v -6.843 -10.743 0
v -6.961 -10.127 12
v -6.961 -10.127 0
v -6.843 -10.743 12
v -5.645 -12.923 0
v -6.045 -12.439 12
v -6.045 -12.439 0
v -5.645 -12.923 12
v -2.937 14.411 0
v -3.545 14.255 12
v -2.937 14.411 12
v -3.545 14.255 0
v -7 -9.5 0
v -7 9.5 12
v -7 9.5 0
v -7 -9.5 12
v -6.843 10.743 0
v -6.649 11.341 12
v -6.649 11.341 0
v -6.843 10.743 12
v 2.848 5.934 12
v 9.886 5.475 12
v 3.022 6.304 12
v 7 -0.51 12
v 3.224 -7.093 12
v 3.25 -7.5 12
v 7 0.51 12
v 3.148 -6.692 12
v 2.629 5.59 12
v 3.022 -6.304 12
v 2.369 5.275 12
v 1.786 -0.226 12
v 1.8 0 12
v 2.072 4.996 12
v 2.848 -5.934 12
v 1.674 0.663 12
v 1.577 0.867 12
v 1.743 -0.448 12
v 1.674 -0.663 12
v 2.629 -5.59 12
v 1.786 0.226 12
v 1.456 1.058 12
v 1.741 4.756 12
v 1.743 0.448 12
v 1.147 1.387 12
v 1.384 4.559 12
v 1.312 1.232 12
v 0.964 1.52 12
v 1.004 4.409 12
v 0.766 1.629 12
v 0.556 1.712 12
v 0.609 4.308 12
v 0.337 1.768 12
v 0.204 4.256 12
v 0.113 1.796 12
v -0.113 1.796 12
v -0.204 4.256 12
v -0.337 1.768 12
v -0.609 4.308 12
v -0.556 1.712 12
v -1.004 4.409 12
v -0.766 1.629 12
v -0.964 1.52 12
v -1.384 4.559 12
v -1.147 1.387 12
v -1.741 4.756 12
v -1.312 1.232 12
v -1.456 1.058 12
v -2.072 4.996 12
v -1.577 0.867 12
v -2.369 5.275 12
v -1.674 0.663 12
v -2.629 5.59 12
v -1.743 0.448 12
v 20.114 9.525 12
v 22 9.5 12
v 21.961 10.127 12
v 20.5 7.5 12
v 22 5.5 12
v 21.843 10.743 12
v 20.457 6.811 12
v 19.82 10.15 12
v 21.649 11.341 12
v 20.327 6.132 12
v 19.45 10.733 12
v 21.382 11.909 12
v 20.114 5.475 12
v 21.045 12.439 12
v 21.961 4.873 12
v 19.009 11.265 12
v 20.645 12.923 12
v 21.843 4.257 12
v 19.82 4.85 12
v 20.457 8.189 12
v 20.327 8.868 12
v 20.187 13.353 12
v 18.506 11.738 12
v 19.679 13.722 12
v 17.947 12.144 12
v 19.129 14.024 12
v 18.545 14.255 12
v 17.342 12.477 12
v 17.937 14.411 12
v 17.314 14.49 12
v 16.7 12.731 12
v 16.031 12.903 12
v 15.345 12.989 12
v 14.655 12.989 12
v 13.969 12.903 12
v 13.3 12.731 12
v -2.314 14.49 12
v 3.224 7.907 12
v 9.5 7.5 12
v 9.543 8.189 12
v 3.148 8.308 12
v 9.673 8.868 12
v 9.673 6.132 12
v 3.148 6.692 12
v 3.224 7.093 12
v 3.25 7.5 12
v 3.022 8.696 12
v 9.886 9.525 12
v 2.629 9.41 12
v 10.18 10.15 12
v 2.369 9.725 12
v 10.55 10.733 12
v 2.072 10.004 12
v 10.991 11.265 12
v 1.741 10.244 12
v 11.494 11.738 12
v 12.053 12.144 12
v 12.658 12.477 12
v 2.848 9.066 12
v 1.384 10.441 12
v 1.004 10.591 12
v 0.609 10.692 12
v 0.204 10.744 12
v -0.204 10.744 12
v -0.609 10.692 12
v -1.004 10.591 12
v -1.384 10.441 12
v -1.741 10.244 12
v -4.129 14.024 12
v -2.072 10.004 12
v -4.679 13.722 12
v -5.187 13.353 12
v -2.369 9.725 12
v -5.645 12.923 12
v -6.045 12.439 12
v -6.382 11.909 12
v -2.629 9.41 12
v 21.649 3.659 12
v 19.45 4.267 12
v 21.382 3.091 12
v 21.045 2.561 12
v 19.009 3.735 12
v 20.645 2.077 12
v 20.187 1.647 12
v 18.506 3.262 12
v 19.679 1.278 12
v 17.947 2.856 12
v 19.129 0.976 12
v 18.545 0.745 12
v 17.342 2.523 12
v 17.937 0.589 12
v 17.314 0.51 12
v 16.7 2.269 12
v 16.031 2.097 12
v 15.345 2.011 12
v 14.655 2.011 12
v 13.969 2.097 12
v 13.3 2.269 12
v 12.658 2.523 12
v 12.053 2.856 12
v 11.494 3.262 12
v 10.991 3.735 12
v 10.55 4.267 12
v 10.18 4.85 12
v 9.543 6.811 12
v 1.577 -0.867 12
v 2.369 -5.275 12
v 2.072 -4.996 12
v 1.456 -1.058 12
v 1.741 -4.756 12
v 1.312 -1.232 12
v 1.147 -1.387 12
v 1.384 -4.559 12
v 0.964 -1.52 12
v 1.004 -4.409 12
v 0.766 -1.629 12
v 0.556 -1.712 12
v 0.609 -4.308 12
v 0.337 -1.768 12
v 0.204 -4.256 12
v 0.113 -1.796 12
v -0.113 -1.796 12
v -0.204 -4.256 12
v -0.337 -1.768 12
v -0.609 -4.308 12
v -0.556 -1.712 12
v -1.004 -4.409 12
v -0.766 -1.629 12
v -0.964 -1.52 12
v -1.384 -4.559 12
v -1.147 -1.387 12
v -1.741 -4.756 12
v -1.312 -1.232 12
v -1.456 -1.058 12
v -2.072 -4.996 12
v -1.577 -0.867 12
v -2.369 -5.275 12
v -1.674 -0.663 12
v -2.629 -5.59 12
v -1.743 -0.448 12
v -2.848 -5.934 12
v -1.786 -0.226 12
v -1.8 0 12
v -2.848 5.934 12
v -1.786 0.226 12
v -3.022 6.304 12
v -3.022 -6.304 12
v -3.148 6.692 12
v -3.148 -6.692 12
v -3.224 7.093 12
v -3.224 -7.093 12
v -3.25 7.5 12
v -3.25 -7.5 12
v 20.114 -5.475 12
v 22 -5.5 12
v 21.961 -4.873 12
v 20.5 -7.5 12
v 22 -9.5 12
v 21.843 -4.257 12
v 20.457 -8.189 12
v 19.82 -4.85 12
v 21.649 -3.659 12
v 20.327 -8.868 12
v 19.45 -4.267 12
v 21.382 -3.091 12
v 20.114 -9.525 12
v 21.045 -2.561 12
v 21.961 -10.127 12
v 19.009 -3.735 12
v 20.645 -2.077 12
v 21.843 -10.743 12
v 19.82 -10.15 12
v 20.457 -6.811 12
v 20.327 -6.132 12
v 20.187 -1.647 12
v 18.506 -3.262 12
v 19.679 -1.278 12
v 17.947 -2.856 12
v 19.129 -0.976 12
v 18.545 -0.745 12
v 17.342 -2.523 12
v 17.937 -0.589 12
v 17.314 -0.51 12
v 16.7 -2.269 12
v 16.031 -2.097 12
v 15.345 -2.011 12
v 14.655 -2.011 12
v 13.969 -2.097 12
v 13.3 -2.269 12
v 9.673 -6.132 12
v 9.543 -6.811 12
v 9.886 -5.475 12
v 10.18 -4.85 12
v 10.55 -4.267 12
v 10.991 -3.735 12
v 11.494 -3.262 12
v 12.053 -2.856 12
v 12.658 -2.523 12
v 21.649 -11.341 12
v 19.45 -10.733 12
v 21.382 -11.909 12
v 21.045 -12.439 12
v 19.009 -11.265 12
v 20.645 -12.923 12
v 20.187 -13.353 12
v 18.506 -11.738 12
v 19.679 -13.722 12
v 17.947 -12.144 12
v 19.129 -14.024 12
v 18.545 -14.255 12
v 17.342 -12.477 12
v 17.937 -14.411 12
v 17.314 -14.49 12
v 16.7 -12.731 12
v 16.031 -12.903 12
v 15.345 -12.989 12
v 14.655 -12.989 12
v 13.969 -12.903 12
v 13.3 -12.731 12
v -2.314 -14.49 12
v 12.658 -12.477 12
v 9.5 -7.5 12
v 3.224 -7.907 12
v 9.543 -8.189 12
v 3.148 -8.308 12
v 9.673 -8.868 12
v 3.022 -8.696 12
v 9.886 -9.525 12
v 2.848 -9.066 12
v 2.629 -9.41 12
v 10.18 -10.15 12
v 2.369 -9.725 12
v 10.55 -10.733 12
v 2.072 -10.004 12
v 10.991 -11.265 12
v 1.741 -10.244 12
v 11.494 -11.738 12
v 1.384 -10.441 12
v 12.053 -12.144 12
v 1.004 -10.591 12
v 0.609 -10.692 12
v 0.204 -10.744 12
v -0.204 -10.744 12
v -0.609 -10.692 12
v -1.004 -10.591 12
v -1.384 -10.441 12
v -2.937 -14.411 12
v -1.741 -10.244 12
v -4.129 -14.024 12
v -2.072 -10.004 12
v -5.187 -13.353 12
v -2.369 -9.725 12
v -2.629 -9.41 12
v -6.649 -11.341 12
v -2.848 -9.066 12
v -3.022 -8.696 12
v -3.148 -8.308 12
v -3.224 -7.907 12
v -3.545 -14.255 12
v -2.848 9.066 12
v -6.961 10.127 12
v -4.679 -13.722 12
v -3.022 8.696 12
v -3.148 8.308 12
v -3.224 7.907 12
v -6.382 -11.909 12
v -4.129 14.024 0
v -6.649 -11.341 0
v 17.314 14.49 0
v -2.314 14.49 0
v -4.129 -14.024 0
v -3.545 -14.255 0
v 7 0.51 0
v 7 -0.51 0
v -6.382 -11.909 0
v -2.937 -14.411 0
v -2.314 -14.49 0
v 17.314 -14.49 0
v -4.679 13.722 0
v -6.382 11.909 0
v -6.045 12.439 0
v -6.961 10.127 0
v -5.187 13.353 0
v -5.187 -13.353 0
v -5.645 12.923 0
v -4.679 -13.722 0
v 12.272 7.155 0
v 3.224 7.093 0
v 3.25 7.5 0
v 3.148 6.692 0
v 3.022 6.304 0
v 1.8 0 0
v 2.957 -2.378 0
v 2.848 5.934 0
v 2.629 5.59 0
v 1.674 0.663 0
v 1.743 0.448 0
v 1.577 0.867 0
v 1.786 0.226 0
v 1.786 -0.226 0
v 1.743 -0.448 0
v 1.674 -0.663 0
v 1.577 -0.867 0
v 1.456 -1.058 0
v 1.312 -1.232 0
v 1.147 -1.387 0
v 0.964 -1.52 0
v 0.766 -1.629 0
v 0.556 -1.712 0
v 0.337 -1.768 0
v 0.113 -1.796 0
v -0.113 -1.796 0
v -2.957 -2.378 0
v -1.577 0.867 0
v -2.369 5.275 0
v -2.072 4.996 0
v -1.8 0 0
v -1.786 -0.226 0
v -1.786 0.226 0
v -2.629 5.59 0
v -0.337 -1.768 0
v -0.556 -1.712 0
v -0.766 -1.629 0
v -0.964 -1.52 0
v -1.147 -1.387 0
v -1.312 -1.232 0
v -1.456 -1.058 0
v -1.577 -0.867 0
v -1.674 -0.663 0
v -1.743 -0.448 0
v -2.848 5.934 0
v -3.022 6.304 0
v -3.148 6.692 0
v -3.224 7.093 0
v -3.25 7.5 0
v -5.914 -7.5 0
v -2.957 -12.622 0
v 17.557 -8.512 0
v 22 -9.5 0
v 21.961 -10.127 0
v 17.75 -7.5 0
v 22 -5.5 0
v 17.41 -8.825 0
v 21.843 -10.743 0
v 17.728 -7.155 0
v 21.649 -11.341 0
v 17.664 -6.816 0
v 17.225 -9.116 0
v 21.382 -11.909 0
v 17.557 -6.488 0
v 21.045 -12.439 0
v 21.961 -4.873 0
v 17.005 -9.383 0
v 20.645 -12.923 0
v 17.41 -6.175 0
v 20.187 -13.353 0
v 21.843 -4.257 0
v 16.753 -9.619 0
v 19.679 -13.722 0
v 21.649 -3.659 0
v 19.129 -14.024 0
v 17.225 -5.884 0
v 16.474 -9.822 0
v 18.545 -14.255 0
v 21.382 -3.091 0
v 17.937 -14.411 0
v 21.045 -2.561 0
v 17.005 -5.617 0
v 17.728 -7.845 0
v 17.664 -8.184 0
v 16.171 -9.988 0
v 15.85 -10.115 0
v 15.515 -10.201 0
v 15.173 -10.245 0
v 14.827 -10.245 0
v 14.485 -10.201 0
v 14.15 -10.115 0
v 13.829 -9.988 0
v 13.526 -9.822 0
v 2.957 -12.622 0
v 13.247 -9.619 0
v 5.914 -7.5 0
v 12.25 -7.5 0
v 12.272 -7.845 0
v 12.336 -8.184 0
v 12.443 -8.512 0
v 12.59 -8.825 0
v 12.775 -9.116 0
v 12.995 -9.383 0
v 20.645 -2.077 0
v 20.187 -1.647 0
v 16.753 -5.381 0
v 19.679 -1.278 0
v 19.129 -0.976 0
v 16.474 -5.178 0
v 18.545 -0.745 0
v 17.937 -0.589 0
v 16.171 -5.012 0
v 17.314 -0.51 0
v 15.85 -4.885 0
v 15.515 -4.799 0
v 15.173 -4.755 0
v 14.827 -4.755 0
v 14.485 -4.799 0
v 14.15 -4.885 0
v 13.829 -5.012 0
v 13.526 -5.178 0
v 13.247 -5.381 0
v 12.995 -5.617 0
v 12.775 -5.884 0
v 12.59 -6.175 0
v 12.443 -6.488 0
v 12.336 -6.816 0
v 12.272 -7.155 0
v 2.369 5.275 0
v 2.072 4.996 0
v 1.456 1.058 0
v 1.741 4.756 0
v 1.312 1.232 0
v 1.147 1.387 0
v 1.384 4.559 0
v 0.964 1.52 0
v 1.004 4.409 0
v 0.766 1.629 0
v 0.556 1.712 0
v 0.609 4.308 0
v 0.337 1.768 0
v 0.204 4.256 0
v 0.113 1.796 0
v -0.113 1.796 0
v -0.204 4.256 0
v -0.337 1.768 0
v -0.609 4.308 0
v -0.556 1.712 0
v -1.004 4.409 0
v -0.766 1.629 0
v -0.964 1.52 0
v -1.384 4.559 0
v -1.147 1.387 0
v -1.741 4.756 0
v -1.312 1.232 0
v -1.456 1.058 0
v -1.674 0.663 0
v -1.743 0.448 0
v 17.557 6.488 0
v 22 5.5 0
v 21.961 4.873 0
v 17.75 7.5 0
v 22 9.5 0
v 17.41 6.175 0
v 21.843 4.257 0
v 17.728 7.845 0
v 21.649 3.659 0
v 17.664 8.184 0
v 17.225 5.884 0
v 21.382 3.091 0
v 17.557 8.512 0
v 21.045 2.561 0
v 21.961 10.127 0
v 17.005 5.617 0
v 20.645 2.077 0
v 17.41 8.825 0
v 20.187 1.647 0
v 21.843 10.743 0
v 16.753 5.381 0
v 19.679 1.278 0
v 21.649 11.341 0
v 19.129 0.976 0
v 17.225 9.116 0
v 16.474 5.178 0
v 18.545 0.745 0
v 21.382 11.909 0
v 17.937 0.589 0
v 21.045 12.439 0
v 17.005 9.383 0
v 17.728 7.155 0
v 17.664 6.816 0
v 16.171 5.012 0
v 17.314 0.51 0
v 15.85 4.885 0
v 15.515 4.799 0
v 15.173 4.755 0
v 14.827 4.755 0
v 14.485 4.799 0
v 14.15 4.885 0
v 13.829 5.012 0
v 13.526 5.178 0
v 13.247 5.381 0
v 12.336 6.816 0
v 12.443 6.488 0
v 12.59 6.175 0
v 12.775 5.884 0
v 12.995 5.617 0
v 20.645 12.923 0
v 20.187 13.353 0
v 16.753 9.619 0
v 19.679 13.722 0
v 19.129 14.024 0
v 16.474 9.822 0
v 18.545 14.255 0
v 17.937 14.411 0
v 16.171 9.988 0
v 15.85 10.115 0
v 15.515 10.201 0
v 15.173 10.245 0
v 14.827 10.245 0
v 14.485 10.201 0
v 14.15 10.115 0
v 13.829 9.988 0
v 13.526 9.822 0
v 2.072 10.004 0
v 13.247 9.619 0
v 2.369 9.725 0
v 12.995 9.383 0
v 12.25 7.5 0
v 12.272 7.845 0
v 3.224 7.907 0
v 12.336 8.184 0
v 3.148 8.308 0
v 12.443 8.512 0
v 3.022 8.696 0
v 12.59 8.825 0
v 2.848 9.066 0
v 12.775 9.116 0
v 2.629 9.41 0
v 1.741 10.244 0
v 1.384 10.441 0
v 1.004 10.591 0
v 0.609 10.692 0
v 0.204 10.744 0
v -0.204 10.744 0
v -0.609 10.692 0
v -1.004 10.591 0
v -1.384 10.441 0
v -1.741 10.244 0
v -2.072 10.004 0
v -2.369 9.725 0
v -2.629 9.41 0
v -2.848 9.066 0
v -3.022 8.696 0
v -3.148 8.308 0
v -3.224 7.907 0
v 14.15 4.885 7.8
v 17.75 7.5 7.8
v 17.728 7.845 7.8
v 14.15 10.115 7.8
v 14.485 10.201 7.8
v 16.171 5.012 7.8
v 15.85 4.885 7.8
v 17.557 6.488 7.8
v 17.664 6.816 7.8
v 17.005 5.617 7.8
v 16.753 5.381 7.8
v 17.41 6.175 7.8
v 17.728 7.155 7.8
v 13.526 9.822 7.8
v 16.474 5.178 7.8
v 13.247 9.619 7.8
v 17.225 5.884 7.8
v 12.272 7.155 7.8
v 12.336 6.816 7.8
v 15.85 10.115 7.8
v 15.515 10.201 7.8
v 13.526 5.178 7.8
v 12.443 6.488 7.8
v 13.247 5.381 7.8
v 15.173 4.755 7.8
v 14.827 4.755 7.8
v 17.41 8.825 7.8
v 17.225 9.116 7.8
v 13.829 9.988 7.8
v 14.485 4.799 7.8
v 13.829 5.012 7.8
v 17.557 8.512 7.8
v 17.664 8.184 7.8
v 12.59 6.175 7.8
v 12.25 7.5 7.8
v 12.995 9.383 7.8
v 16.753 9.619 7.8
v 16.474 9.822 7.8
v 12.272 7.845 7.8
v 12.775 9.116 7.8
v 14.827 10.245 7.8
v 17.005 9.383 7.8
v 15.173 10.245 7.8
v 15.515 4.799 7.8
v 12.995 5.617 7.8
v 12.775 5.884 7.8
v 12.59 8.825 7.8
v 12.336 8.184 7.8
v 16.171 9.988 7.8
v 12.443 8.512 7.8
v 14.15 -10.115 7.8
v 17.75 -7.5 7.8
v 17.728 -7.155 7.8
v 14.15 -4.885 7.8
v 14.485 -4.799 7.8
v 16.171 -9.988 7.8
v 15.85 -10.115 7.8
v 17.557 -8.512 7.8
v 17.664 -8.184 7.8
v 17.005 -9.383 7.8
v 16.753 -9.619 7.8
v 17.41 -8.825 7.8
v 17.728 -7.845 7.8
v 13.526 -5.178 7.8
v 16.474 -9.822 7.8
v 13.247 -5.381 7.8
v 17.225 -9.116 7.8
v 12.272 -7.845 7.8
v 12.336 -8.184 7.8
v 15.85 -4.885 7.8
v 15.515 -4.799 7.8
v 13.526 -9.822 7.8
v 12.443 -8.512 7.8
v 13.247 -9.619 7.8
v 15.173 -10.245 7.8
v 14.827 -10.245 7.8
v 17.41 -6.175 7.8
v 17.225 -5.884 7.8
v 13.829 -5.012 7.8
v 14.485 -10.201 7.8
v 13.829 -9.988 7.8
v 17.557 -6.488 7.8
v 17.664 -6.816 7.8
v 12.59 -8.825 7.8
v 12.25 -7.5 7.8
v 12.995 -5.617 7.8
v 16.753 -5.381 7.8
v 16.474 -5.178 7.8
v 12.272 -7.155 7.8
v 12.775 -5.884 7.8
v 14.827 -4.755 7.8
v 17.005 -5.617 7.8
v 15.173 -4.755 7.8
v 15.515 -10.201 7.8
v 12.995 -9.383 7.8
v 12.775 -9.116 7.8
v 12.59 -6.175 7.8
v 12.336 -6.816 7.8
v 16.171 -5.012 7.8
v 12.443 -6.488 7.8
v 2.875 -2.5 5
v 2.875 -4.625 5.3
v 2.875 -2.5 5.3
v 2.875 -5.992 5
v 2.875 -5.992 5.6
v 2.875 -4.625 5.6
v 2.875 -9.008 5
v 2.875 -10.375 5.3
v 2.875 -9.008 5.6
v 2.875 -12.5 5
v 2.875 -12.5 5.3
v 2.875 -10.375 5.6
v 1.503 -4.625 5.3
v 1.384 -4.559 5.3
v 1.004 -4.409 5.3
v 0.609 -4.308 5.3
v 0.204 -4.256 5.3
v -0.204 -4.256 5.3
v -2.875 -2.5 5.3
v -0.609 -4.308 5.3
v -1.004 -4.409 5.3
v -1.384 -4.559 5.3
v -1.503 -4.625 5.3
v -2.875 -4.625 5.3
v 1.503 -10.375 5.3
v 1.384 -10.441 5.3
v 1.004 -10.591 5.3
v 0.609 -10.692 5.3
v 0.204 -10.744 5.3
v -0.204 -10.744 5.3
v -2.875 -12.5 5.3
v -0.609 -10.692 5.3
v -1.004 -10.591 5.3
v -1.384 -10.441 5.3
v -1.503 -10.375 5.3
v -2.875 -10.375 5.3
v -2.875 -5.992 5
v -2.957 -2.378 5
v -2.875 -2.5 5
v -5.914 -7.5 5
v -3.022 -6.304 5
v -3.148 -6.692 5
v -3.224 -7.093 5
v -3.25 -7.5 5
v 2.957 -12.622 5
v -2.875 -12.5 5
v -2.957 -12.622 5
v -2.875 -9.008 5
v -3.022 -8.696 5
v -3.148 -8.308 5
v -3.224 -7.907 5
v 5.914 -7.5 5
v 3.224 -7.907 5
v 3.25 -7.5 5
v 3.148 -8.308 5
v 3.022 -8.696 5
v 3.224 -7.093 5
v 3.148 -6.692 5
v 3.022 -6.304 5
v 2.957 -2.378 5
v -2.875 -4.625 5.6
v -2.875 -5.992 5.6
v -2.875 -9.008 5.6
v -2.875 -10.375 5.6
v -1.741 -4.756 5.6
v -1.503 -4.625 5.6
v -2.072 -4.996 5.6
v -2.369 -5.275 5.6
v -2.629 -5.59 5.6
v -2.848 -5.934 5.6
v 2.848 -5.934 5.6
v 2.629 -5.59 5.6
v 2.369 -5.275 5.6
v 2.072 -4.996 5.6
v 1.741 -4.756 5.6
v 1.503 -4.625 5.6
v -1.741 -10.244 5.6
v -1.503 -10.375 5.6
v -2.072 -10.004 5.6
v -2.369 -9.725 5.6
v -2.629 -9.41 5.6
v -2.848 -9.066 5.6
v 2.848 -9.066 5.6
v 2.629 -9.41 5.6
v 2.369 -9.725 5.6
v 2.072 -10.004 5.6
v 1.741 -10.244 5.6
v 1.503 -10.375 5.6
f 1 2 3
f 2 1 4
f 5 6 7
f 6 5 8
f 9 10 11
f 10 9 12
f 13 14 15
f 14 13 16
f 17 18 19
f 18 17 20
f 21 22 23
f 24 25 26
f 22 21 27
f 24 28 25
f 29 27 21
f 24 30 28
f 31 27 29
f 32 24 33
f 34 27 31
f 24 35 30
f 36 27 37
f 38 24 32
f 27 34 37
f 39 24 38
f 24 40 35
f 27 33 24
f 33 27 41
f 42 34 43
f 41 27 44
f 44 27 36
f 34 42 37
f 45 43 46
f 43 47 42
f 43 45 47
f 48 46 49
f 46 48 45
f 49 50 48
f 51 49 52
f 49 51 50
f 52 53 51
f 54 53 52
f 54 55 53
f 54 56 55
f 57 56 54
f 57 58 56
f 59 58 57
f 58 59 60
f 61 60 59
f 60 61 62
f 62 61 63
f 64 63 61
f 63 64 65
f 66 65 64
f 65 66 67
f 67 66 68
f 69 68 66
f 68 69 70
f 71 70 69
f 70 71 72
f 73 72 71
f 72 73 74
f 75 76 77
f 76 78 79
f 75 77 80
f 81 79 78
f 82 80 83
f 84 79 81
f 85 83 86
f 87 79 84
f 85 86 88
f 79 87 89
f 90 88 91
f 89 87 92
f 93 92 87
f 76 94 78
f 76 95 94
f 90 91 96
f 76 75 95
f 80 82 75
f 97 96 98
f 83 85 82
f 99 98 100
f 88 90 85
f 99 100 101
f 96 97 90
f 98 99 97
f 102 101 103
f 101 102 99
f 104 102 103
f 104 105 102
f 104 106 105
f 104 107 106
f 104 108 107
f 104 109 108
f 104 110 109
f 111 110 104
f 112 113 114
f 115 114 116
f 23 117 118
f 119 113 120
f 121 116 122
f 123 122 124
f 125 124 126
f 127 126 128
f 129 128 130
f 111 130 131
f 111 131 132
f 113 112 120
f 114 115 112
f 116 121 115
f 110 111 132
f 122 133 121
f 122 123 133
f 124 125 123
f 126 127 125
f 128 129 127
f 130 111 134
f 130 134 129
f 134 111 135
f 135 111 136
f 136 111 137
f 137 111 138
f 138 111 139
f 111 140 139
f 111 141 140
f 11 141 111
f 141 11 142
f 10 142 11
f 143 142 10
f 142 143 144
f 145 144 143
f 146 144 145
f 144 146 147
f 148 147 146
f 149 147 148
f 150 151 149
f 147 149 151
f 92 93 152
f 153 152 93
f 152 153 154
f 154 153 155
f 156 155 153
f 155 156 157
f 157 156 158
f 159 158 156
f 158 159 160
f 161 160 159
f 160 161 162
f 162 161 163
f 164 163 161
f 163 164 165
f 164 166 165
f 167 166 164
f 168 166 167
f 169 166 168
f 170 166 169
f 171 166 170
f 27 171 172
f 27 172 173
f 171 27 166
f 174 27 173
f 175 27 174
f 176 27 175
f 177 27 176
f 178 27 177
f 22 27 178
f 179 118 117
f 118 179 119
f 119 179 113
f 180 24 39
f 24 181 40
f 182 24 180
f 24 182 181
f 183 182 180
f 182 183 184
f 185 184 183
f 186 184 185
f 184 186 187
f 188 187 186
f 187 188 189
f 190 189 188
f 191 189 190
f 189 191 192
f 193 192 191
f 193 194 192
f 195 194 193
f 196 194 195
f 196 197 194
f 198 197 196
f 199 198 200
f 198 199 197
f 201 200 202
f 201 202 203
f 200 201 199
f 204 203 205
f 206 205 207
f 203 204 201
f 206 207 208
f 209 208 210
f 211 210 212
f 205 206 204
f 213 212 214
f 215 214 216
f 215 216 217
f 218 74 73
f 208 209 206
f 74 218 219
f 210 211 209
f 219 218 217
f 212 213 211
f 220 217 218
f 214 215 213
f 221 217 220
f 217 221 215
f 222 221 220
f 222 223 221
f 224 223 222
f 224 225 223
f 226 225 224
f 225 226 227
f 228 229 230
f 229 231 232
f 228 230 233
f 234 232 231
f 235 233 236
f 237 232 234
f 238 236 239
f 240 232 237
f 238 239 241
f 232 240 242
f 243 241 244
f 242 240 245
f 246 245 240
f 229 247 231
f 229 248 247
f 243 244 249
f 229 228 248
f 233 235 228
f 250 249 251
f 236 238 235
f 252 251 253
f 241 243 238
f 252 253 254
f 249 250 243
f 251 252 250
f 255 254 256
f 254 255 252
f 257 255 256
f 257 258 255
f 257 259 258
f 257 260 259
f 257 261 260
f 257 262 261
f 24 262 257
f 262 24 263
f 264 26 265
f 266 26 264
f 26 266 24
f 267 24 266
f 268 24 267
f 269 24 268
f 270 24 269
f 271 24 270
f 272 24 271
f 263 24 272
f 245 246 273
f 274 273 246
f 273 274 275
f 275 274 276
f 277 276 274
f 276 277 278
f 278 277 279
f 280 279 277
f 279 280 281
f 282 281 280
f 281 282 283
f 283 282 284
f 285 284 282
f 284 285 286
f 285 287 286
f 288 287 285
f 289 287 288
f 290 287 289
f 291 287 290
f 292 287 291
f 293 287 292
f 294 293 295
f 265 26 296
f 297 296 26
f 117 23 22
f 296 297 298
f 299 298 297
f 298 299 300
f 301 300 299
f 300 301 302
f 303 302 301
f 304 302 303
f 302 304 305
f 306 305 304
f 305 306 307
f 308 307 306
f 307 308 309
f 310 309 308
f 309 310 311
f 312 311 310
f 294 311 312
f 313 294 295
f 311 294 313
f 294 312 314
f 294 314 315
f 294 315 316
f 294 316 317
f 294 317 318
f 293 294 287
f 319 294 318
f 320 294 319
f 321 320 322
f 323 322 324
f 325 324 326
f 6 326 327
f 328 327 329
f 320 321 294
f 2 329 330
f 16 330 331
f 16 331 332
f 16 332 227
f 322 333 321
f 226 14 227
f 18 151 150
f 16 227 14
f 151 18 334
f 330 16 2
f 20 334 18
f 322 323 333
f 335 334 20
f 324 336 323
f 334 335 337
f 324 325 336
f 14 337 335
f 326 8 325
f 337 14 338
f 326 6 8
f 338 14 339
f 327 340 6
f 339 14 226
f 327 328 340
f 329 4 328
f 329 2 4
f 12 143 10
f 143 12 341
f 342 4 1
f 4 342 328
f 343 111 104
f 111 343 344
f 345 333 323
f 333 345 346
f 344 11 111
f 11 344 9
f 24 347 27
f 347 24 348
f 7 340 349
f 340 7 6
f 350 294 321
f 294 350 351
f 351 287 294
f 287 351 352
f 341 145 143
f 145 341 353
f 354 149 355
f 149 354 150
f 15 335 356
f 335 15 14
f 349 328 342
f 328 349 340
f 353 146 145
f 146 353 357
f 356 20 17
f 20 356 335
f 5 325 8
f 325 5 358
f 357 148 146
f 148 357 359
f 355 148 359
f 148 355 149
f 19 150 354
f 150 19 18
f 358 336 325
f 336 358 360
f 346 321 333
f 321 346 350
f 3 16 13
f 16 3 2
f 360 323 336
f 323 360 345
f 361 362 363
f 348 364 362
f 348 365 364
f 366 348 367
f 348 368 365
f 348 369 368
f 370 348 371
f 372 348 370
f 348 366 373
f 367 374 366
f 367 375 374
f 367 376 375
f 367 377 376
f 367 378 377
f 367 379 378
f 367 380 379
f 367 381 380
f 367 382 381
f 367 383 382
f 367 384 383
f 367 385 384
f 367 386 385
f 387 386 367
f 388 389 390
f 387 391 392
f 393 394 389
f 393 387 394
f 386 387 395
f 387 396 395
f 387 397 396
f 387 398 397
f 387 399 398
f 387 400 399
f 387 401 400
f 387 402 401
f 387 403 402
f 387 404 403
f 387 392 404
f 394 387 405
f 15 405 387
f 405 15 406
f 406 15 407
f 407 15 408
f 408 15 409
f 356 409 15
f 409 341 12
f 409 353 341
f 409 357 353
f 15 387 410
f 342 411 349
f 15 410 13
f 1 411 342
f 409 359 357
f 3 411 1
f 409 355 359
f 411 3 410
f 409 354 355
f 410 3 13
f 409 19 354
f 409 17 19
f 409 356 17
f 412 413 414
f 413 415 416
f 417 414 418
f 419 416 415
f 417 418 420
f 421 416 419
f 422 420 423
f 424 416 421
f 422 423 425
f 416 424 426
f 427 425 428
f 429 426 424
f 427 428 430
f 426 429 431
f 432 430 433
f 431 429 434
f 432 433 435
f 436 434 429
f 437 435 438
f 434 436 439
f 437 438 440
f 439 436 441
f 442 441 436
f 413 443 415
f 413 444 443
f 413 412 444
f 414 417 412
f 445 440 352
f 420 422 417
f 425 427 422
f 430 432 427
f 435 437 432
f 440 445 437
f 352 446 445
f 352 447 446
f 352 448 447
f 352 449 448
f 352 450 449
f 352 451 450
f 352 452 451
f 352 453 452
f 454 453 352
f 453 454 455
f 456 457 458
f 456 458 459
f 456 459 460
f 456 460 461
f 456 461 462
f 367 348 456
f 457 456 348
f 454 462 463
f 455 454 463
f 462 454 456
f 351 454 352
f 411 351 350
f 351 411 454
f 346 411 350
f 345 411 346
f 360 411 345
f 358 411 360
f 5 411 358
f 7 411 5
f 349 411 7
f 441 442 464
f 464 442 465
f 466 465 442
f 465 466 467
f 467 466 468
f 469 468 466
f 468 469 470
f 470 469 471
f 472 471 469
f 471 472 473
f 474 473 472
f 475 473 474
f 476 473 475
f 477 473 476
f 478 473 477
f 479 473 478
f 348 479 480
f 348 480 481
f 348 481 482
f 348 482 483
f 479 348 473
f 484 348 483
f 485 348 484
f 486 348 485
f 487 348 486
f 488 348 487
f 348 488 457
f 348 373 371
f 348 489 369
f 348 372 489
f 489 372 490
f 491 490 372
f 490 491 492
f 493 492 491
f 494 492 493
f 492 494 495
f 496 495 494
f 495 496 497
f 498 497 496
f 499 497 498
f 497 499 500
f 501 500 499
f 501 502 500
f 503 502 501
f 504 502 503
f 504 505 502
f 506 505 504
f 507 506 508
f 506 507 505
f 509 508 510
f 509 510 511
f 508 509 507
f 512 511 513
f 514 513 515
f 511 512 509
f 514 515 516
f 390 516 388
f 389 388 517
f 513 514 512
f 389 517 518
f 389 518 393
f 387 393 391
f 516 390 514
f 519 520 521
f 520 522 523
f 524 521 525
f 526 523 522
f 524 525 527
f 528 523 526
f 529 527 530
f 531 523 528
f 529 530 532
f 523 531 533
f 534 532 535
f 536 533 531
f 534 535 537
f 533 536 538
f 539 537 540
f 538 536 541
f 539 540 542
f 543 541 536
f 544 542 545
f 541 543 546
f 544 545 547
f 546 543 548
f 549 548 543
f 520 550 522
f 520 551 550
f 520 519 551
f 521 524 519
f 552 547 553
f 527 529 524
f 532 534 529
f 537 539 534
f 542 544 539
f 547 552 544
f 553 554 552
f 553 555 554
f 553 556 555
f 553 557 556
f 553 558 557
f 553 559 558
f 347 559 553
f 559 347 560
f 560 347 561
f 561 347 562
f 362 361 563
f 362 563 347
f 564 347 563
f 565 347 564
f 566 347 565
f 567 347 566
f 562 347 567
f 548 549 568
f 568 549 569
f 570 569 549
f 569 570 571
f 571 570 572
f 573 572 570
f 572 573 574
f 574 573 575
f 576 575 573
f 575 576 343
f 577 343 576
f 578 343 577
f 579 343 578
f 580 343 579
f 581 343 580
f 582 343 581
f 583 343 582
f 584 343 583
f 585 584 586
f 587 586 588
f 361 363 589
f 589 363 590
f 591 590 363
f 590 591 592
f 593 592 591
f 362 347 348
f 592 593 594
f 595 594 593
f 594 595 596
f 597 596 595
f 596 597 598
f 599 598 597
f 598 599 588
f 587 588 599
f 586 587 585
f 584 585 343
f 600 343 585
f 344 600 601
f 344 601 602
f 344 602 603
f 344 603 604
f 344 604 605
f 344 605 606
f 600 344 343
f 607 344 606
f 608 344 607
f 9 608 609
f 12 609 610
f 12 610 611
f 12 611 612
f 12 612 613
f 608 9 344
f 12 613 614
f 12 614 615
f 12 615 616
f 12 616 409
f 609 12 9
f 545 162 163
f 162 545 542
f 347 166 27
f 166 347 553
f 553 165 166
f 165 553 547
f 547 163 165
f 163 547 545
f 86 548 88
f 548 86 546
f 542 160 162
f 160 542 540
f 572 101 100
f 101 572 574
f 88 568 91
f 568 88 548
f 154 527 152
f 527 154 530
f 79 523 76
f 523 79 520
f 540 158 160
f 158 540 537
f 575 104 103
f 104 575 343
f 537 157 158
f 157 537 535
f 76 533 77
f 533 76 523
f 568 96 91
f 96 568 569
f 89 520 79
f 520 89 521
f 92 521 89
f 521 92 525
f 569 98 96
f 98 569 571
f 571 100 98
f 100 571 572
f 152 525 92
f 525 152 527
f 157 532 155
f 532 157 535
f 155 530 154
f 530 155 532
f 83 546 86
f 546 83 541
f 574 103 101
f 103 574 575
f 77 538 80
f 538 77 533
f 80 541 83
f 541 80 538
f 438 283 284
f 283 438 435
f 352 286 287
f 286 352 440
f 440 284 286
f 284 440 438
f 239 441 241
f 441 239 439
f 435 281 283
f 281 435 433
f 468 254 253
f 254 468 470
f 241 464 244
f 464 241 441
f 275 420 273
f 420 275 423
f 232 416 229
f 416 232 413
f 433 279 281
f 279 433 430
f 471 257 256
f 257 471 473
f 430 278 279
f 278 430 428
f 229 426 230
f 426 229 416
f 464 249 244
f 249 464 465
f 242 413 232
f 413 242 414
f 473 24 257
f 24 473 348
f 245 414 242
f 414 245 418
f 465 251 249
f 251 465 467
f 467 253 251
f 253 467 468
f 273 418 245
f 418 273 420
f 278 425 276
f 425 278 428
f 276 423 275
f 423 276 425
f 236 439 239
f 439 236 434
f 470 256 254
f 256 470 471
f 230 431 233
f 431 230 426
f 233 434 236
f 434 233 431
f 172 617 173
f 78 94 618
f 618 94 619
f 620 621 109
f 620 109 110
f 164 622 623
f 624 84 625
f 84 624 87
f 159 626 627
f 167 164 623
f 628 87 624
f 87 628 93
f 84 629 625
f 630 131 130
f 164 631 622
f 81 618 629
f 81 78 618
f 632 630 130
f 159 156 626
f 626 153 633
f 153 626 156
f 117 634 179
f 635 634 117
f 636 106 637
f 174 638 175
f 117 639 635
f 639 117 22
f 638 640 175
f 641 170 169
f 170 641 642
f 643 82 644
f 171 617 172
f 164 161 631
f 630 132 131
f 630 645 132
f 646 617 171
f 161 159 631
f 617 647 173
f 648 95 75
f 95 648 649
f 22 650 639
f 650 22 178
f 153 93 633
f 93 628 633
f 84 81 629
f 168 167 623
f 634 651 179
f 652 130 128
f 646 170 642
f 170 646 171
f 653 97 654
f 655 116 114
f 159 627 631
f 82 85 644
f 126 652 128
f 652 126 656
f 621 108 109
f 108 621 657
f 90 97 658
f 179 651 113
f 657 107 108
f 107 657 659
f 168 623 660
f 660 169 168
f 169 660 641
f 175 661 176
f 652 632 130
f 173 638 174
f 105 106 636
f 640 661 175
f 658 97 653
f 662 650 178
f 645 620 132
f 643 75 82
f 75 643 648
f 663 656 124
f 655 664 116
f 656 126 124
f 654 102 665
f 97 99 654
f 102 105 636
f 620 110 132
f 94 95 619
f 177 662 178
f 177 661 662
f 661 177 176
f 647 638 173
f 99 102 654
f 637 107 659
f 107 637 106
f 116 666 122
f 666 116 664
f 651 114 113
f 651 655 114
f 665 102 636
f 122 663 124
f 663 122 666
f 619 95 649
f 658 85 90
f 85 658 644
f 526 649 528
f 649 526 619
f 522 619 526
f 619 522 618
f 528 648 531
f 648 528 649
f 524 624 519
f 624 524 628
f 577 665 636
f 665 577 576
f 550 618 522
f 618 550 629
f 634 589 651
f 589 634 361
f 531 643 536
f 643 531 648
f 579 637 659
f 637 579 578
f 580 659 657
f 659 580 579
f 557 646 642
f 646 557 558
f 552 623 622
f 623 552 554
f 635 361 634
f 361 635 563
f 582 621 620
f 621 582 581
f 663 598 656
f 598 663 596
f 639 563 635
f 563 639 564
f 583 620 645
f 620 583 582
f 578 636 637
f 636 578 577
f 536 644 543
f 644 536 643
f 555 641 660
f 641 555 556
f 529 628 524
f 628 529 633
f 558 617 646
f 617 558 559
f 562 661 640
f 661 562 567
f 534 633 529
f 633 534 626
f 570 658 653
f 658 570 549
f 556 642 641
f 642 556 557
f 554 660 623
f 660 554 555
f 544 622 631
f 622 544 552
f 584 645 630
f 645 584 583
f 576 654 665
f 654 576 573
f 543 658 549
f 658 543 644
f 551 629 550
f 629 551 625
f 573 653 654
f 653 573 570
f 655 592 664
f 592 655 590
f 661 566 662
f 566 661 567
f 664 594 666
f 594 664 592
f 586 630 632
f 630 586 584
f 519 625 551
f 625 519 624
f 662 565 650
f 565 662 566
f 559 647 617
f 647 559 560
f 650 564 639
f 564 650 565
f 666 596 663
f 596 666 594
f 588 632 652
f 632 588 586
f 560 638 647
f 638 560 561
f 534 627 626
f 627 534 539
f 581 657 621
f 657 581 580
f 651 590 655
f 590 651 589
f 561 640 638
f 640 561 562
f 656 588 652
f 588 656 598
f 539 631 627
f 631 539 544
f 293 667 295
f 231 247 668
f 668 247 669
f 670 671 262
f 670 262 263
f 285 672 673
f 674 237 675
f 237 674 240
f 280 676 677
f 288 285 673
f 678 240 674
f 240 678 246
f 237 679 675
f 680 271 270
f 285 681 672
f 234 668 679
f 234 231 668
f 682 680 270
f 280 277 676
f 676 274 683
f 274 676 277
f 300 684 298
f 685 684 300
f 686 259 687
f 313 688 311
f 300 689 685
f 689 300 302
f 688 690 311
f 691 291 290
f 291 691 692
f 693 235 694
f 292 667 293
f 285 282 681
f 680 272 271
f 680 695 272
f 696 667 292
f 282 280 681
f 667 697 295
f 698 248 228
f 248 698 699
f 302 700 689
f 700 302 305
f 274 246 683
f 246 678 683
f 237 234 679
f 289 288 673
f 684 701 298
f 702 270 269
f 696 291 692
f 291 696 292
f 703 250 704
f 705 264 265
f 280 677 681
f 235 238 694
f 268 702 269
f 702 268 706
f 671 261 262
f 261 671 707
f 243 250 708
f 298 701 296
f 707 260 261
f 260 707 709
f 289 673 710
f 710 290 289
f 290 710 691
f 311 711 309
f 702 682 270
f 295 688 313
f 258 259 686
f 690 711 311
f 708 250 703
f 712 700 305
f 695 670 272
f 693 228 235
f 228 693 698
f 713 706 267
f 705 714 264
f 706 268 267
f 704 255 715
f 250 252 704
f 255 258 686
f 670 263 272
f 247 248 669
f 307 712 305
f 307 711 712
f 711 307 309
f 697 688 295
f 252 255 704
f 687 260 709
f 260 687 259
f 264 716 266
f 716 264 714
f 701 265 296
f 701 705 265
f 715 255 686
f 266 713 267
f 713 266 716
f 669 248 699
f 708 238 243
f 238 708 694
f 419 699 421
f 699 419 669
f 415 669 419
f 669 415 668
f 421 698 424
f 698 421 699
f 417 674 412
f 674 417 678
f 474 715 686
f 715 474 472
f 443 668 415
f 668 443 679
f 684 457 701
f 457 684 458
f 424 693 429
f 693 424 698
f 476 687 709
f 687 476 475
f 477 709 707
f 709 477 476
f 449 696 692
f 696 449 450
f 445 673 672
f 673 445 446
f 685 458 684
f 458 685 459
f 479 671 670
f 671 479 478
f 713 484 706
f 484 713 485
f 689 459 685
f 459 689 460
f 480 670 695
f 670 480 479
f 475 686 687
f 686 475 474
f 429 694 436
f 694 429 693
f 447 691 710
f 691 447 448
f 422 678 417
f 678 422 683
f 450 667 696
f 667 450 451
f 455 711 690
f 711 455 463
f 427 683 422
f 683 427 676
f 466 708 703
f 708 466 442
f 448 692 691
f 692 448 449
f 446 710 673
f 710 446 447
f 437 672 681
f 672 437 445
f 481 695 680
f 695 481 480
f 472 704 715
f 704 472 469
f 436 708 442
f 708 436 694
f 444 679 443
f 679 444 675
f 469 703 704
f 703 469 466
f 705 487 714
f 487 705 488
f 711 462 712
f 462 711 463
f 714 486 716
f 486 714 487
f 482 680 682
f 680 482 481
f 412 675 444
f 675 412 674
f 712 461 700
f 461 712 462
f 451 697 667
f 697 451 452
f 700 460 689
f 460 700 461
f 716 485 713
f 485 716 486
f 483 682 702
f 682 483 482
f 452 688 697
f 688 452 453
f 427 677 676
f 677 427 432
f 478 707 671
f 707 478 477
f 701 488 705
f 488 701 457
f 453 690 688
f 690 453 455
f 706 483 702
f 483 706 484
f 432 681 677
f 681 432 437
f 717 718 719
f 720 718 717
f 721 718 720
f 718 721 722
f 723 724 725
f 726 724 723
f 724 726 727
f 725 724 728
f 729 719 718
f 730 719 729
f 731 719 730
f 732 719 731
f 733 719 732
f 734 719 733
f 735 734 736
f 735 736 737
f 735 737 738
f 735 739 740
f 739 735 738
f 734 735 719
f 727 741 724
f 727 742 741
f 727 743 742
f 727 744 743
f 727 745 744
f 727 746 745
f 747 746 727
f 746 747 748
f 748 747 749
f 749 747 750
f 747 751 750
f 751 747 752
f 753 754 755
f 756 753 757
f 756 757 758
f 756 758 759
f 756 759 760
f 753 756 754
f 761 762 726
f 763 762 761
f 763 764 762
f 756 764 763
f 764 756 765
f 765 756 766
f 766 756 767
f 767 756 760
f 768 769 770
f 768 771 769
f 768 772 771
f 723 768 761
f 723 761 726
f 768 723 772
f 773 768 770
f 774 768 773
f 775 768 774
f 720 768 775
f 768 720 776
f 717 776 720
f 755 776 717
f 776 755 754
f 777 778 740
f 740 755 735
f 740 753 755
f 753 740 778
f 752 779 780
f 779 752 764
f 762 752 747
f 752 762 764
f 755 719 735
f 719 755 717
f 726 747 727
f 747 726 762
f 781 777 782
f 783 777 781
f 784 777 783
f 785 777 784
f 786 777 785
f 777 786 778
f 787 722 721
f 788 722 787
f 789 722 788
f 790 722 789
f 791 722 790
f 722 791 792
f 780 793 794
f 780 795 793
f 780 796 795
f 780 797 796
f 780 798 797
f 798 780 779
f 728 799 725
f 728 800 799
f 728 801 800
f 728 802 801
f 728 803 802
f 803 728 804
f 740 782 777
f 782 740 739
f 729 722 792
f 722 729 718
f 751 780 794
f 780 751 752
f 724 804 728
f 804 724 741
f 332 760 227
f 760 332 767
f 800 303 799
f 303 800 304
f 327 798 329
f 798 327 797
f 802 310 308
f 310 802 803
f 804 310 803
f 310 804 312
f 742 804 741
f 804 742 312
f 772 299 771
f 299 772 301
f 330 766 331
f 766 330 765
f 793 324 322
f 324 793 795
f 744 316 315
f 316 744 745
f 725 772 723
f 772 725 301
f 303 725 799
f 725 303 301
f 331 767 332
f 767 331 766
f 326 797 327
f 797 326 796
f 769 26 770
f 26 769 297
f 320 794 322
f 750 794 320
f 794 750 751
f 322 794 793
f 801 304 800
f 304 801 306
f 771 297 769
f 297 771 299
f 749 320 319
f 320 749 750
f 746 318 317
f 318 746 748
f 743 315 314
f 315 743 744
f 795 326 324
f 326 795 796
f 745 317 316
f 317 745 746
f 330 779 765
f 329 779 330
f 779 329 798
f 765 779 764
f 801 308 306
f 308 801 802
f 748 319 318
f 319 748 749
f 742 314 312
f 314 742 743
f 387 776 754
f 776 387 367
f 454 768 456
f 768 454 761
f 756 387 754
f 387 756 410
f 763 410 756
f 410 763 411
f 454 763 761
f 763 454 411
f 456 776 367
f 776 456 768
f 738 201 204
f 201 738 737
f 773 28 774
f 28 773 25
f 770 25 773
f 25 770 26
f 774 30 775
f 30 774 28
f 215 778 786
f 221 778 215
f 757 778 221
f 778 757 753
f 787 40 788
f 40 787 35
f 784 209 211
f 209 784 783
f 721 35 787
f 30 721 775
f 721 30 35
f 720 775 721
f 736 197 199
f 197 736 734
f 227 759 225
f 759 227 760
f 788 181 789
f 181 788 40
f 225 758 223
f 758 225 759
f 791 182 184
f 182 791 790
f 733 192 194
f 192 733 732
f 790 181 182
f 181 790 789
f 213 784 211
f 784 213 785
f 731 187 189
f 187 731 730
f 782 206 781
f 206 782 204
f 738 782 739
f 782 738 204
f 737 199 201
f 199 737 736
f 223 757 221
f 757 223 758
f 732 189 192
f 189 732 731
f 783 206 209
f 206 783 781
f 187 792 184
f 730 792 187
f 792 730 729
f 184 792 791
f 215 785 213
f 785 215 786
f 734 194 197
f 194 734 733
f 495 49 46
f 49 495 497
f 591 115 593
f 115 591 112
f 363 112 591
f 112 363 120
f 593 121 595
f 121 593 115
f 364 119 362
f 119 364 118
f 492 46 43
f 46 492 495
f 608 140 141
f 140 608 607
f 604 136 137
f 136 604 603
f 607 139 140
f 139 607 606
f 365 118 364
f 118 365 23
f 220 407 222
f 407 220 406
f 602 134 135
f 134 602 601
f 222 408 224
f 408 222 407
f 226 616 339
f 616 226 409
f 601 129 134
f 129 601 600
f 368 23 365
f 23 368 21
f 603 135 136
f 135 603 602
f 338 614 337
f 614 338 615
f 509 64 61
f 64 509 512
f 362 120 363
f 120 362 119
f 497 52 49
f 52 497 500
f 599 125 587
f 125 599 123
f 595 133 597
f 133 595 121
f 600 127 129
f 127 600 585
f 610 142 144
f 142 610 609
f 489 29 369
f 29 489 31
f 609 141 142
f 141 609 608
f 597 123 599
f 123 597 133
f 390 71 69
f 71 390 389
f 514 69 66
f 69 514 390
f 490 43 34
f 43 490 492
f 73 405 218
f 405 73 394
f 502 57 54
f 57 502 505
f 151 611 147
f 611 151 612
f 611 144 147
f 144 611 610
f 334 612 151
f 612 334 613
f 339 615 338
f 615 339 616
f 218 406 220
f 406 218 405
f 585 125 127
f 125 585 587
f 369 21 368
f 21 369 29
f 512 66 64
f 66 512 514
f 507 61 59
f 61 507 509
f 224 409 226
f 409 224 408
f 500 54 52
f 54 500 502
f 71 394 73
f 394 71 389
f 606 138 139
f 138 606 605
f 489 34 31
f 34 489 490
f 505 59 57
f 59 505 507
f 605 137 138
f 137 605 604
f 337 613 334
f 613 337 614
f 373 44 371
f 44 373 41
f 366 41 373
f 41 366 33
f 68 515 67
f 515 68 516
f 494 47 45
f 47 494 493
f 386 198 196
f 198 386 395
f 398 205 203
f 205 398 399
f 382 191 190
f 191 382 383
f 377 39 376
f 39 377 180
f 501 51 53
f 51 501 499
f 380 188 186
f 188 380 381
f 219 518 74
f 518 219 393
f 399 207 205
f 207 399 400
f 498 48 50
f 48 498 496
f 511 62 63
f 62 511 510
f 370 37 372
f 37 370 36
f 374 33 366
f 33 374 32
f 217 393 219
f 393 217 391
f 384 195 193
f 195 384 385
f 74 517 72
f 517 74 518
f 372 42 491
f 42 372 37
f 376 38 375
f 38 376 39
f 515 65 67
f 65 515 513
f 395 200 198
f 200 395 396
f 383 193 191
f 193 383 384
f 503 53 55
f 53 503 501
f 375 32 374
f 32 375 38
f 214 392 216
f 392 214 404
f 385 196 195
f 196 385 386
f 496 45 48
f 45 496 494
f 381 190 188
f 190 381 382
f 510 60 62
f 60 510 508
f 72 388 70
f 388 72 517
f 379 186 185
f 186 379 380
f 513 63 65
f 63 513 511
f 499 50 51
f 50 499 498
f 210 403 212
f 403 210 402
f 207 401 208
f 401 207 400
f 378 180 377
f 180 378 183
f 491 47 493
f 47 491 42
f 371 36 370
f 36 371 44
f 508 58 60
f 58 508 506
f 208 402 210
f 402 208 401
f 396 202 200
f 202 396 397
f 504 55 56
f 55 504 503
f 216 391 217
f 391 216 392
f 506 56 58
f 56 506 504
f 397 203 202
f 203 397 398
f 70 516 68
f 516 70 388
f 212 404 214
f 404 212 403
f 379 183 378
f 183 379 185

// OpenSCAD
$fn = 50;


difference() {
	union() {
		hull() {
			translate(v = [-2.0000000000, 9.5000000000, 0]) {
				cylinder(h = 12, r = 5);
			}
			translate(v = [2.0000000000, 9.5000000000, 0]) {
				cylinder(h = 12, r = 5);
			}
			translate(v = [-2.0000000000, -9.5000000000, 0]) {
				cylinder(h = 12, r = 5);
			}
			translate(v = [2.0000000000, -9.5000000000, 0]) {
				cylinder(h = 12, r = 5);
			}
		}
		translate(v = [7.5000000000, 7.5000000000, 0]) {
			hull() {
				translate(v = [-9.5000000000, 2.0000000000, 0]) {
					cylinder(h = 12, r = 5);
				}
				translate(v = [9.5000000000, 2.0000000000, 0]) {
					cylinder(h = 12, r = 5);
				}
				translate(v = [-9.5000000000, -2.0000000000, 0]) {
					cylinder(h = 12, r = 5);
				}
				translate(v = [9.5000000000, -2.0000000000, 0]) {
					cylinder(h = 12, r = 5);
				}
			}
		}
		translate(v = [7.5000000000, -7.5000000000, 0]) {
			hull() {
				translate(v = [-9.5000000000, 2.0000000000, 0]) {
					cylinder(h = 12, r = 5);
				}
				translate(v = [9.5000000000, 2.0000000000, 0]) {
					cylinder(h = 12, r = 5);
				}
				translate(v = [-9.5000000000, -2.0000000000, 0]) {
					cylinder(h = 12, r = 5);
				}
				translate(v = [9.5000000000, -2.0000000000, 0]) {
					cylinder(h = 12, r = 5);
				}
			}
		}
	}
	union() {
		translate(v = [15.0000000000, 7.5000000000, 12]) {
			rotate(a = [0, 0, 0]) {
				difference() {
					union() {
						#translate(v = [0, 0, -12.0000000000]) {
							cylinder(h = 12, r = 2.2500000000);
						}
						#translate(v = [0, 0, -4.2000000000]) {
							cylinder(h = 4.2000000000, r1 = 2.7500000000, r2 = 5.5000000000);
						}
						#translate(v = [0, 0, -12.0000000000]) {
							cylinder(h = 12, r = 2.7500000000);
						}
						#translate(v = [0, 0, -12.0000000000]) {
							cylinder(h = 12, r = 2.2500000000);
						}
					}
					union();
				}
			}
		}
		translate(v = [15.0000000000, -7.5000000000, 12]) {
			rotate(a = [0, 0, 0]) {
				difference() {
					union() {
						#translate(v = [0, 0, -12.0000000000]) {
							cylinder(h = 12, r = 2.2500000000);
						}
						#translate(v = [0, 0, -4.2000000000]) {
							cylinder(h = 4.2000000000, r1 = 2.7500000000, r2 = 5.5000000000);
						}
						#translate(v = [0, 0, -12.0000000000]) {
							cylinder(h = 12, r = 2.7500000000);
						}
						#translate(v = [0, 0, -12.0000000000]) {
							cylinder(h = 12, r = 2.2500000000);
						}
					}
					union();
				}
			}
		}
		translate(v = [0.0000000000, -7.5000000000, 0]) {
			rotate(a = [0, 0, 0]) {
				difference() {
					union() {
						#translate(v = [-2.8750000000, -5.0000000000, -0.3000000000]) {
							cube(size = [5.7500000000, 10, 0.3000000000]);
						}
						#translate(v = [-2.8750000000, -2.8750000000, -0.6000000000]) {
							cube(size = [5.7500000000, 5.7500000000, 0.3000000000]);
						}
						#translate(v = [-2.8750000000, -5.0000000000, 5]) {
							cube(size = [5.7500000000, 10, 0.3000000000]);
						}
						#translate(v = [-2.8750000000, -2.8750000000, 5.3000000000]) {
							cube(size = [5.7500000000, 5.7500000000, 0.3000000000]);
						}
						#translate(v = [0, 0, -100.0000000000]) {
							cylinder(h = 200, r = 3.2500000000);
						}
						#linear_extrude(height = 5) {
							polygon(points = [[5.9142500000, 0.0000000000], [2.9571250000, 5.1218907443], [-2.9571250000, 5.1218907443], [-5.9142500000, 0.0000000000], [-2.9571250000, -5.1218907443], [2.9571250000, -5.1218907443]]);
						}
						#translate(v = [-2.8750000000, -5.0000000000, -0.3000000000]) {
							cube(size = [5.7500000000, 10, 0.3000000000]);
						}
						#translate(v = [-2.8750000000, -2.8750000000, -0.6000000000]) {
							cube(size = [5.7500000000, 5.7500000000, 0.3000000000]);
						}
						#translate(v = [-2.8750000000, -5.0000000000, 5]) {
							cube(size = [5.7500000000, 10, 0.3000000000]);
						}
						#translate(v = [-2.8750000000, -2.8750000000, 5.3000000000]) {
							cube(size = [5.7500000000, 5.7500000000, 0.3000000000]);
						}
						#translate(v = [0, 0, -100.0000000000]) {
							cylinder(h = 200, r = 3.2500000000);
						}
						#translate(v = [-2.8750000000, -5.0000000000, -0.3000000000]) {
							cube(size = [5.7500000000, 10, 0.3000000000]);
						}
						#translate(v = [-2.8750000000, -2.8750000000, -0.6000000000]) {
							cube(size = [5.7500000000, 5.7500000000, 0.3000000000]);
						}
						#translate(v = [-2.8750000000, -5.0000000000, 5]) {
							cube(size = [5.7500000000, 10, 0.3000000000]);
						}
						#translate(v = [-2.8750000000, -2.8750000000, 5.3000000000]) {
							cube(size = [5.7500000000, 5.7500000000, 0.3000000000]);
						}
						#translate(v = [0, 0, -100.0000000000]) {
							cylinder(h = 200, r = 3.2500000000);
						}
					}
					union();
				}
			}
		}
		translate(v = [0.0000000000, -7.5000000000, 0]) {
			translate(v = [0, 0, -100]) {
				cylinder(h = 200, r = 3.2500000000);
			}
		}
		translate(v = [0.0000000000, 7.5000000000, 0]) {
			translate(v = [0, 0, -100]) {
				cylinder(h = 200, r = 3.2500000000);
			}
		}
		translate(v = [0.0000000000, -7.5000000000, 0]) {
			translate(v = [0, 0, -100]) {
				cylinder(h = 200, r = 1.8000000000);
			}
		}
		translate(v = [0, 0, -100]) {
			cylinder(h = 200, r = 1.8000000000);
		}
		translate(v = [0.0000000000, 7.5000000000, 0]) {
			translate(v = [0, 0, -100]) {
				cylinder(h = 200, r = 1.8000000000);
			}
		}
	}
}
